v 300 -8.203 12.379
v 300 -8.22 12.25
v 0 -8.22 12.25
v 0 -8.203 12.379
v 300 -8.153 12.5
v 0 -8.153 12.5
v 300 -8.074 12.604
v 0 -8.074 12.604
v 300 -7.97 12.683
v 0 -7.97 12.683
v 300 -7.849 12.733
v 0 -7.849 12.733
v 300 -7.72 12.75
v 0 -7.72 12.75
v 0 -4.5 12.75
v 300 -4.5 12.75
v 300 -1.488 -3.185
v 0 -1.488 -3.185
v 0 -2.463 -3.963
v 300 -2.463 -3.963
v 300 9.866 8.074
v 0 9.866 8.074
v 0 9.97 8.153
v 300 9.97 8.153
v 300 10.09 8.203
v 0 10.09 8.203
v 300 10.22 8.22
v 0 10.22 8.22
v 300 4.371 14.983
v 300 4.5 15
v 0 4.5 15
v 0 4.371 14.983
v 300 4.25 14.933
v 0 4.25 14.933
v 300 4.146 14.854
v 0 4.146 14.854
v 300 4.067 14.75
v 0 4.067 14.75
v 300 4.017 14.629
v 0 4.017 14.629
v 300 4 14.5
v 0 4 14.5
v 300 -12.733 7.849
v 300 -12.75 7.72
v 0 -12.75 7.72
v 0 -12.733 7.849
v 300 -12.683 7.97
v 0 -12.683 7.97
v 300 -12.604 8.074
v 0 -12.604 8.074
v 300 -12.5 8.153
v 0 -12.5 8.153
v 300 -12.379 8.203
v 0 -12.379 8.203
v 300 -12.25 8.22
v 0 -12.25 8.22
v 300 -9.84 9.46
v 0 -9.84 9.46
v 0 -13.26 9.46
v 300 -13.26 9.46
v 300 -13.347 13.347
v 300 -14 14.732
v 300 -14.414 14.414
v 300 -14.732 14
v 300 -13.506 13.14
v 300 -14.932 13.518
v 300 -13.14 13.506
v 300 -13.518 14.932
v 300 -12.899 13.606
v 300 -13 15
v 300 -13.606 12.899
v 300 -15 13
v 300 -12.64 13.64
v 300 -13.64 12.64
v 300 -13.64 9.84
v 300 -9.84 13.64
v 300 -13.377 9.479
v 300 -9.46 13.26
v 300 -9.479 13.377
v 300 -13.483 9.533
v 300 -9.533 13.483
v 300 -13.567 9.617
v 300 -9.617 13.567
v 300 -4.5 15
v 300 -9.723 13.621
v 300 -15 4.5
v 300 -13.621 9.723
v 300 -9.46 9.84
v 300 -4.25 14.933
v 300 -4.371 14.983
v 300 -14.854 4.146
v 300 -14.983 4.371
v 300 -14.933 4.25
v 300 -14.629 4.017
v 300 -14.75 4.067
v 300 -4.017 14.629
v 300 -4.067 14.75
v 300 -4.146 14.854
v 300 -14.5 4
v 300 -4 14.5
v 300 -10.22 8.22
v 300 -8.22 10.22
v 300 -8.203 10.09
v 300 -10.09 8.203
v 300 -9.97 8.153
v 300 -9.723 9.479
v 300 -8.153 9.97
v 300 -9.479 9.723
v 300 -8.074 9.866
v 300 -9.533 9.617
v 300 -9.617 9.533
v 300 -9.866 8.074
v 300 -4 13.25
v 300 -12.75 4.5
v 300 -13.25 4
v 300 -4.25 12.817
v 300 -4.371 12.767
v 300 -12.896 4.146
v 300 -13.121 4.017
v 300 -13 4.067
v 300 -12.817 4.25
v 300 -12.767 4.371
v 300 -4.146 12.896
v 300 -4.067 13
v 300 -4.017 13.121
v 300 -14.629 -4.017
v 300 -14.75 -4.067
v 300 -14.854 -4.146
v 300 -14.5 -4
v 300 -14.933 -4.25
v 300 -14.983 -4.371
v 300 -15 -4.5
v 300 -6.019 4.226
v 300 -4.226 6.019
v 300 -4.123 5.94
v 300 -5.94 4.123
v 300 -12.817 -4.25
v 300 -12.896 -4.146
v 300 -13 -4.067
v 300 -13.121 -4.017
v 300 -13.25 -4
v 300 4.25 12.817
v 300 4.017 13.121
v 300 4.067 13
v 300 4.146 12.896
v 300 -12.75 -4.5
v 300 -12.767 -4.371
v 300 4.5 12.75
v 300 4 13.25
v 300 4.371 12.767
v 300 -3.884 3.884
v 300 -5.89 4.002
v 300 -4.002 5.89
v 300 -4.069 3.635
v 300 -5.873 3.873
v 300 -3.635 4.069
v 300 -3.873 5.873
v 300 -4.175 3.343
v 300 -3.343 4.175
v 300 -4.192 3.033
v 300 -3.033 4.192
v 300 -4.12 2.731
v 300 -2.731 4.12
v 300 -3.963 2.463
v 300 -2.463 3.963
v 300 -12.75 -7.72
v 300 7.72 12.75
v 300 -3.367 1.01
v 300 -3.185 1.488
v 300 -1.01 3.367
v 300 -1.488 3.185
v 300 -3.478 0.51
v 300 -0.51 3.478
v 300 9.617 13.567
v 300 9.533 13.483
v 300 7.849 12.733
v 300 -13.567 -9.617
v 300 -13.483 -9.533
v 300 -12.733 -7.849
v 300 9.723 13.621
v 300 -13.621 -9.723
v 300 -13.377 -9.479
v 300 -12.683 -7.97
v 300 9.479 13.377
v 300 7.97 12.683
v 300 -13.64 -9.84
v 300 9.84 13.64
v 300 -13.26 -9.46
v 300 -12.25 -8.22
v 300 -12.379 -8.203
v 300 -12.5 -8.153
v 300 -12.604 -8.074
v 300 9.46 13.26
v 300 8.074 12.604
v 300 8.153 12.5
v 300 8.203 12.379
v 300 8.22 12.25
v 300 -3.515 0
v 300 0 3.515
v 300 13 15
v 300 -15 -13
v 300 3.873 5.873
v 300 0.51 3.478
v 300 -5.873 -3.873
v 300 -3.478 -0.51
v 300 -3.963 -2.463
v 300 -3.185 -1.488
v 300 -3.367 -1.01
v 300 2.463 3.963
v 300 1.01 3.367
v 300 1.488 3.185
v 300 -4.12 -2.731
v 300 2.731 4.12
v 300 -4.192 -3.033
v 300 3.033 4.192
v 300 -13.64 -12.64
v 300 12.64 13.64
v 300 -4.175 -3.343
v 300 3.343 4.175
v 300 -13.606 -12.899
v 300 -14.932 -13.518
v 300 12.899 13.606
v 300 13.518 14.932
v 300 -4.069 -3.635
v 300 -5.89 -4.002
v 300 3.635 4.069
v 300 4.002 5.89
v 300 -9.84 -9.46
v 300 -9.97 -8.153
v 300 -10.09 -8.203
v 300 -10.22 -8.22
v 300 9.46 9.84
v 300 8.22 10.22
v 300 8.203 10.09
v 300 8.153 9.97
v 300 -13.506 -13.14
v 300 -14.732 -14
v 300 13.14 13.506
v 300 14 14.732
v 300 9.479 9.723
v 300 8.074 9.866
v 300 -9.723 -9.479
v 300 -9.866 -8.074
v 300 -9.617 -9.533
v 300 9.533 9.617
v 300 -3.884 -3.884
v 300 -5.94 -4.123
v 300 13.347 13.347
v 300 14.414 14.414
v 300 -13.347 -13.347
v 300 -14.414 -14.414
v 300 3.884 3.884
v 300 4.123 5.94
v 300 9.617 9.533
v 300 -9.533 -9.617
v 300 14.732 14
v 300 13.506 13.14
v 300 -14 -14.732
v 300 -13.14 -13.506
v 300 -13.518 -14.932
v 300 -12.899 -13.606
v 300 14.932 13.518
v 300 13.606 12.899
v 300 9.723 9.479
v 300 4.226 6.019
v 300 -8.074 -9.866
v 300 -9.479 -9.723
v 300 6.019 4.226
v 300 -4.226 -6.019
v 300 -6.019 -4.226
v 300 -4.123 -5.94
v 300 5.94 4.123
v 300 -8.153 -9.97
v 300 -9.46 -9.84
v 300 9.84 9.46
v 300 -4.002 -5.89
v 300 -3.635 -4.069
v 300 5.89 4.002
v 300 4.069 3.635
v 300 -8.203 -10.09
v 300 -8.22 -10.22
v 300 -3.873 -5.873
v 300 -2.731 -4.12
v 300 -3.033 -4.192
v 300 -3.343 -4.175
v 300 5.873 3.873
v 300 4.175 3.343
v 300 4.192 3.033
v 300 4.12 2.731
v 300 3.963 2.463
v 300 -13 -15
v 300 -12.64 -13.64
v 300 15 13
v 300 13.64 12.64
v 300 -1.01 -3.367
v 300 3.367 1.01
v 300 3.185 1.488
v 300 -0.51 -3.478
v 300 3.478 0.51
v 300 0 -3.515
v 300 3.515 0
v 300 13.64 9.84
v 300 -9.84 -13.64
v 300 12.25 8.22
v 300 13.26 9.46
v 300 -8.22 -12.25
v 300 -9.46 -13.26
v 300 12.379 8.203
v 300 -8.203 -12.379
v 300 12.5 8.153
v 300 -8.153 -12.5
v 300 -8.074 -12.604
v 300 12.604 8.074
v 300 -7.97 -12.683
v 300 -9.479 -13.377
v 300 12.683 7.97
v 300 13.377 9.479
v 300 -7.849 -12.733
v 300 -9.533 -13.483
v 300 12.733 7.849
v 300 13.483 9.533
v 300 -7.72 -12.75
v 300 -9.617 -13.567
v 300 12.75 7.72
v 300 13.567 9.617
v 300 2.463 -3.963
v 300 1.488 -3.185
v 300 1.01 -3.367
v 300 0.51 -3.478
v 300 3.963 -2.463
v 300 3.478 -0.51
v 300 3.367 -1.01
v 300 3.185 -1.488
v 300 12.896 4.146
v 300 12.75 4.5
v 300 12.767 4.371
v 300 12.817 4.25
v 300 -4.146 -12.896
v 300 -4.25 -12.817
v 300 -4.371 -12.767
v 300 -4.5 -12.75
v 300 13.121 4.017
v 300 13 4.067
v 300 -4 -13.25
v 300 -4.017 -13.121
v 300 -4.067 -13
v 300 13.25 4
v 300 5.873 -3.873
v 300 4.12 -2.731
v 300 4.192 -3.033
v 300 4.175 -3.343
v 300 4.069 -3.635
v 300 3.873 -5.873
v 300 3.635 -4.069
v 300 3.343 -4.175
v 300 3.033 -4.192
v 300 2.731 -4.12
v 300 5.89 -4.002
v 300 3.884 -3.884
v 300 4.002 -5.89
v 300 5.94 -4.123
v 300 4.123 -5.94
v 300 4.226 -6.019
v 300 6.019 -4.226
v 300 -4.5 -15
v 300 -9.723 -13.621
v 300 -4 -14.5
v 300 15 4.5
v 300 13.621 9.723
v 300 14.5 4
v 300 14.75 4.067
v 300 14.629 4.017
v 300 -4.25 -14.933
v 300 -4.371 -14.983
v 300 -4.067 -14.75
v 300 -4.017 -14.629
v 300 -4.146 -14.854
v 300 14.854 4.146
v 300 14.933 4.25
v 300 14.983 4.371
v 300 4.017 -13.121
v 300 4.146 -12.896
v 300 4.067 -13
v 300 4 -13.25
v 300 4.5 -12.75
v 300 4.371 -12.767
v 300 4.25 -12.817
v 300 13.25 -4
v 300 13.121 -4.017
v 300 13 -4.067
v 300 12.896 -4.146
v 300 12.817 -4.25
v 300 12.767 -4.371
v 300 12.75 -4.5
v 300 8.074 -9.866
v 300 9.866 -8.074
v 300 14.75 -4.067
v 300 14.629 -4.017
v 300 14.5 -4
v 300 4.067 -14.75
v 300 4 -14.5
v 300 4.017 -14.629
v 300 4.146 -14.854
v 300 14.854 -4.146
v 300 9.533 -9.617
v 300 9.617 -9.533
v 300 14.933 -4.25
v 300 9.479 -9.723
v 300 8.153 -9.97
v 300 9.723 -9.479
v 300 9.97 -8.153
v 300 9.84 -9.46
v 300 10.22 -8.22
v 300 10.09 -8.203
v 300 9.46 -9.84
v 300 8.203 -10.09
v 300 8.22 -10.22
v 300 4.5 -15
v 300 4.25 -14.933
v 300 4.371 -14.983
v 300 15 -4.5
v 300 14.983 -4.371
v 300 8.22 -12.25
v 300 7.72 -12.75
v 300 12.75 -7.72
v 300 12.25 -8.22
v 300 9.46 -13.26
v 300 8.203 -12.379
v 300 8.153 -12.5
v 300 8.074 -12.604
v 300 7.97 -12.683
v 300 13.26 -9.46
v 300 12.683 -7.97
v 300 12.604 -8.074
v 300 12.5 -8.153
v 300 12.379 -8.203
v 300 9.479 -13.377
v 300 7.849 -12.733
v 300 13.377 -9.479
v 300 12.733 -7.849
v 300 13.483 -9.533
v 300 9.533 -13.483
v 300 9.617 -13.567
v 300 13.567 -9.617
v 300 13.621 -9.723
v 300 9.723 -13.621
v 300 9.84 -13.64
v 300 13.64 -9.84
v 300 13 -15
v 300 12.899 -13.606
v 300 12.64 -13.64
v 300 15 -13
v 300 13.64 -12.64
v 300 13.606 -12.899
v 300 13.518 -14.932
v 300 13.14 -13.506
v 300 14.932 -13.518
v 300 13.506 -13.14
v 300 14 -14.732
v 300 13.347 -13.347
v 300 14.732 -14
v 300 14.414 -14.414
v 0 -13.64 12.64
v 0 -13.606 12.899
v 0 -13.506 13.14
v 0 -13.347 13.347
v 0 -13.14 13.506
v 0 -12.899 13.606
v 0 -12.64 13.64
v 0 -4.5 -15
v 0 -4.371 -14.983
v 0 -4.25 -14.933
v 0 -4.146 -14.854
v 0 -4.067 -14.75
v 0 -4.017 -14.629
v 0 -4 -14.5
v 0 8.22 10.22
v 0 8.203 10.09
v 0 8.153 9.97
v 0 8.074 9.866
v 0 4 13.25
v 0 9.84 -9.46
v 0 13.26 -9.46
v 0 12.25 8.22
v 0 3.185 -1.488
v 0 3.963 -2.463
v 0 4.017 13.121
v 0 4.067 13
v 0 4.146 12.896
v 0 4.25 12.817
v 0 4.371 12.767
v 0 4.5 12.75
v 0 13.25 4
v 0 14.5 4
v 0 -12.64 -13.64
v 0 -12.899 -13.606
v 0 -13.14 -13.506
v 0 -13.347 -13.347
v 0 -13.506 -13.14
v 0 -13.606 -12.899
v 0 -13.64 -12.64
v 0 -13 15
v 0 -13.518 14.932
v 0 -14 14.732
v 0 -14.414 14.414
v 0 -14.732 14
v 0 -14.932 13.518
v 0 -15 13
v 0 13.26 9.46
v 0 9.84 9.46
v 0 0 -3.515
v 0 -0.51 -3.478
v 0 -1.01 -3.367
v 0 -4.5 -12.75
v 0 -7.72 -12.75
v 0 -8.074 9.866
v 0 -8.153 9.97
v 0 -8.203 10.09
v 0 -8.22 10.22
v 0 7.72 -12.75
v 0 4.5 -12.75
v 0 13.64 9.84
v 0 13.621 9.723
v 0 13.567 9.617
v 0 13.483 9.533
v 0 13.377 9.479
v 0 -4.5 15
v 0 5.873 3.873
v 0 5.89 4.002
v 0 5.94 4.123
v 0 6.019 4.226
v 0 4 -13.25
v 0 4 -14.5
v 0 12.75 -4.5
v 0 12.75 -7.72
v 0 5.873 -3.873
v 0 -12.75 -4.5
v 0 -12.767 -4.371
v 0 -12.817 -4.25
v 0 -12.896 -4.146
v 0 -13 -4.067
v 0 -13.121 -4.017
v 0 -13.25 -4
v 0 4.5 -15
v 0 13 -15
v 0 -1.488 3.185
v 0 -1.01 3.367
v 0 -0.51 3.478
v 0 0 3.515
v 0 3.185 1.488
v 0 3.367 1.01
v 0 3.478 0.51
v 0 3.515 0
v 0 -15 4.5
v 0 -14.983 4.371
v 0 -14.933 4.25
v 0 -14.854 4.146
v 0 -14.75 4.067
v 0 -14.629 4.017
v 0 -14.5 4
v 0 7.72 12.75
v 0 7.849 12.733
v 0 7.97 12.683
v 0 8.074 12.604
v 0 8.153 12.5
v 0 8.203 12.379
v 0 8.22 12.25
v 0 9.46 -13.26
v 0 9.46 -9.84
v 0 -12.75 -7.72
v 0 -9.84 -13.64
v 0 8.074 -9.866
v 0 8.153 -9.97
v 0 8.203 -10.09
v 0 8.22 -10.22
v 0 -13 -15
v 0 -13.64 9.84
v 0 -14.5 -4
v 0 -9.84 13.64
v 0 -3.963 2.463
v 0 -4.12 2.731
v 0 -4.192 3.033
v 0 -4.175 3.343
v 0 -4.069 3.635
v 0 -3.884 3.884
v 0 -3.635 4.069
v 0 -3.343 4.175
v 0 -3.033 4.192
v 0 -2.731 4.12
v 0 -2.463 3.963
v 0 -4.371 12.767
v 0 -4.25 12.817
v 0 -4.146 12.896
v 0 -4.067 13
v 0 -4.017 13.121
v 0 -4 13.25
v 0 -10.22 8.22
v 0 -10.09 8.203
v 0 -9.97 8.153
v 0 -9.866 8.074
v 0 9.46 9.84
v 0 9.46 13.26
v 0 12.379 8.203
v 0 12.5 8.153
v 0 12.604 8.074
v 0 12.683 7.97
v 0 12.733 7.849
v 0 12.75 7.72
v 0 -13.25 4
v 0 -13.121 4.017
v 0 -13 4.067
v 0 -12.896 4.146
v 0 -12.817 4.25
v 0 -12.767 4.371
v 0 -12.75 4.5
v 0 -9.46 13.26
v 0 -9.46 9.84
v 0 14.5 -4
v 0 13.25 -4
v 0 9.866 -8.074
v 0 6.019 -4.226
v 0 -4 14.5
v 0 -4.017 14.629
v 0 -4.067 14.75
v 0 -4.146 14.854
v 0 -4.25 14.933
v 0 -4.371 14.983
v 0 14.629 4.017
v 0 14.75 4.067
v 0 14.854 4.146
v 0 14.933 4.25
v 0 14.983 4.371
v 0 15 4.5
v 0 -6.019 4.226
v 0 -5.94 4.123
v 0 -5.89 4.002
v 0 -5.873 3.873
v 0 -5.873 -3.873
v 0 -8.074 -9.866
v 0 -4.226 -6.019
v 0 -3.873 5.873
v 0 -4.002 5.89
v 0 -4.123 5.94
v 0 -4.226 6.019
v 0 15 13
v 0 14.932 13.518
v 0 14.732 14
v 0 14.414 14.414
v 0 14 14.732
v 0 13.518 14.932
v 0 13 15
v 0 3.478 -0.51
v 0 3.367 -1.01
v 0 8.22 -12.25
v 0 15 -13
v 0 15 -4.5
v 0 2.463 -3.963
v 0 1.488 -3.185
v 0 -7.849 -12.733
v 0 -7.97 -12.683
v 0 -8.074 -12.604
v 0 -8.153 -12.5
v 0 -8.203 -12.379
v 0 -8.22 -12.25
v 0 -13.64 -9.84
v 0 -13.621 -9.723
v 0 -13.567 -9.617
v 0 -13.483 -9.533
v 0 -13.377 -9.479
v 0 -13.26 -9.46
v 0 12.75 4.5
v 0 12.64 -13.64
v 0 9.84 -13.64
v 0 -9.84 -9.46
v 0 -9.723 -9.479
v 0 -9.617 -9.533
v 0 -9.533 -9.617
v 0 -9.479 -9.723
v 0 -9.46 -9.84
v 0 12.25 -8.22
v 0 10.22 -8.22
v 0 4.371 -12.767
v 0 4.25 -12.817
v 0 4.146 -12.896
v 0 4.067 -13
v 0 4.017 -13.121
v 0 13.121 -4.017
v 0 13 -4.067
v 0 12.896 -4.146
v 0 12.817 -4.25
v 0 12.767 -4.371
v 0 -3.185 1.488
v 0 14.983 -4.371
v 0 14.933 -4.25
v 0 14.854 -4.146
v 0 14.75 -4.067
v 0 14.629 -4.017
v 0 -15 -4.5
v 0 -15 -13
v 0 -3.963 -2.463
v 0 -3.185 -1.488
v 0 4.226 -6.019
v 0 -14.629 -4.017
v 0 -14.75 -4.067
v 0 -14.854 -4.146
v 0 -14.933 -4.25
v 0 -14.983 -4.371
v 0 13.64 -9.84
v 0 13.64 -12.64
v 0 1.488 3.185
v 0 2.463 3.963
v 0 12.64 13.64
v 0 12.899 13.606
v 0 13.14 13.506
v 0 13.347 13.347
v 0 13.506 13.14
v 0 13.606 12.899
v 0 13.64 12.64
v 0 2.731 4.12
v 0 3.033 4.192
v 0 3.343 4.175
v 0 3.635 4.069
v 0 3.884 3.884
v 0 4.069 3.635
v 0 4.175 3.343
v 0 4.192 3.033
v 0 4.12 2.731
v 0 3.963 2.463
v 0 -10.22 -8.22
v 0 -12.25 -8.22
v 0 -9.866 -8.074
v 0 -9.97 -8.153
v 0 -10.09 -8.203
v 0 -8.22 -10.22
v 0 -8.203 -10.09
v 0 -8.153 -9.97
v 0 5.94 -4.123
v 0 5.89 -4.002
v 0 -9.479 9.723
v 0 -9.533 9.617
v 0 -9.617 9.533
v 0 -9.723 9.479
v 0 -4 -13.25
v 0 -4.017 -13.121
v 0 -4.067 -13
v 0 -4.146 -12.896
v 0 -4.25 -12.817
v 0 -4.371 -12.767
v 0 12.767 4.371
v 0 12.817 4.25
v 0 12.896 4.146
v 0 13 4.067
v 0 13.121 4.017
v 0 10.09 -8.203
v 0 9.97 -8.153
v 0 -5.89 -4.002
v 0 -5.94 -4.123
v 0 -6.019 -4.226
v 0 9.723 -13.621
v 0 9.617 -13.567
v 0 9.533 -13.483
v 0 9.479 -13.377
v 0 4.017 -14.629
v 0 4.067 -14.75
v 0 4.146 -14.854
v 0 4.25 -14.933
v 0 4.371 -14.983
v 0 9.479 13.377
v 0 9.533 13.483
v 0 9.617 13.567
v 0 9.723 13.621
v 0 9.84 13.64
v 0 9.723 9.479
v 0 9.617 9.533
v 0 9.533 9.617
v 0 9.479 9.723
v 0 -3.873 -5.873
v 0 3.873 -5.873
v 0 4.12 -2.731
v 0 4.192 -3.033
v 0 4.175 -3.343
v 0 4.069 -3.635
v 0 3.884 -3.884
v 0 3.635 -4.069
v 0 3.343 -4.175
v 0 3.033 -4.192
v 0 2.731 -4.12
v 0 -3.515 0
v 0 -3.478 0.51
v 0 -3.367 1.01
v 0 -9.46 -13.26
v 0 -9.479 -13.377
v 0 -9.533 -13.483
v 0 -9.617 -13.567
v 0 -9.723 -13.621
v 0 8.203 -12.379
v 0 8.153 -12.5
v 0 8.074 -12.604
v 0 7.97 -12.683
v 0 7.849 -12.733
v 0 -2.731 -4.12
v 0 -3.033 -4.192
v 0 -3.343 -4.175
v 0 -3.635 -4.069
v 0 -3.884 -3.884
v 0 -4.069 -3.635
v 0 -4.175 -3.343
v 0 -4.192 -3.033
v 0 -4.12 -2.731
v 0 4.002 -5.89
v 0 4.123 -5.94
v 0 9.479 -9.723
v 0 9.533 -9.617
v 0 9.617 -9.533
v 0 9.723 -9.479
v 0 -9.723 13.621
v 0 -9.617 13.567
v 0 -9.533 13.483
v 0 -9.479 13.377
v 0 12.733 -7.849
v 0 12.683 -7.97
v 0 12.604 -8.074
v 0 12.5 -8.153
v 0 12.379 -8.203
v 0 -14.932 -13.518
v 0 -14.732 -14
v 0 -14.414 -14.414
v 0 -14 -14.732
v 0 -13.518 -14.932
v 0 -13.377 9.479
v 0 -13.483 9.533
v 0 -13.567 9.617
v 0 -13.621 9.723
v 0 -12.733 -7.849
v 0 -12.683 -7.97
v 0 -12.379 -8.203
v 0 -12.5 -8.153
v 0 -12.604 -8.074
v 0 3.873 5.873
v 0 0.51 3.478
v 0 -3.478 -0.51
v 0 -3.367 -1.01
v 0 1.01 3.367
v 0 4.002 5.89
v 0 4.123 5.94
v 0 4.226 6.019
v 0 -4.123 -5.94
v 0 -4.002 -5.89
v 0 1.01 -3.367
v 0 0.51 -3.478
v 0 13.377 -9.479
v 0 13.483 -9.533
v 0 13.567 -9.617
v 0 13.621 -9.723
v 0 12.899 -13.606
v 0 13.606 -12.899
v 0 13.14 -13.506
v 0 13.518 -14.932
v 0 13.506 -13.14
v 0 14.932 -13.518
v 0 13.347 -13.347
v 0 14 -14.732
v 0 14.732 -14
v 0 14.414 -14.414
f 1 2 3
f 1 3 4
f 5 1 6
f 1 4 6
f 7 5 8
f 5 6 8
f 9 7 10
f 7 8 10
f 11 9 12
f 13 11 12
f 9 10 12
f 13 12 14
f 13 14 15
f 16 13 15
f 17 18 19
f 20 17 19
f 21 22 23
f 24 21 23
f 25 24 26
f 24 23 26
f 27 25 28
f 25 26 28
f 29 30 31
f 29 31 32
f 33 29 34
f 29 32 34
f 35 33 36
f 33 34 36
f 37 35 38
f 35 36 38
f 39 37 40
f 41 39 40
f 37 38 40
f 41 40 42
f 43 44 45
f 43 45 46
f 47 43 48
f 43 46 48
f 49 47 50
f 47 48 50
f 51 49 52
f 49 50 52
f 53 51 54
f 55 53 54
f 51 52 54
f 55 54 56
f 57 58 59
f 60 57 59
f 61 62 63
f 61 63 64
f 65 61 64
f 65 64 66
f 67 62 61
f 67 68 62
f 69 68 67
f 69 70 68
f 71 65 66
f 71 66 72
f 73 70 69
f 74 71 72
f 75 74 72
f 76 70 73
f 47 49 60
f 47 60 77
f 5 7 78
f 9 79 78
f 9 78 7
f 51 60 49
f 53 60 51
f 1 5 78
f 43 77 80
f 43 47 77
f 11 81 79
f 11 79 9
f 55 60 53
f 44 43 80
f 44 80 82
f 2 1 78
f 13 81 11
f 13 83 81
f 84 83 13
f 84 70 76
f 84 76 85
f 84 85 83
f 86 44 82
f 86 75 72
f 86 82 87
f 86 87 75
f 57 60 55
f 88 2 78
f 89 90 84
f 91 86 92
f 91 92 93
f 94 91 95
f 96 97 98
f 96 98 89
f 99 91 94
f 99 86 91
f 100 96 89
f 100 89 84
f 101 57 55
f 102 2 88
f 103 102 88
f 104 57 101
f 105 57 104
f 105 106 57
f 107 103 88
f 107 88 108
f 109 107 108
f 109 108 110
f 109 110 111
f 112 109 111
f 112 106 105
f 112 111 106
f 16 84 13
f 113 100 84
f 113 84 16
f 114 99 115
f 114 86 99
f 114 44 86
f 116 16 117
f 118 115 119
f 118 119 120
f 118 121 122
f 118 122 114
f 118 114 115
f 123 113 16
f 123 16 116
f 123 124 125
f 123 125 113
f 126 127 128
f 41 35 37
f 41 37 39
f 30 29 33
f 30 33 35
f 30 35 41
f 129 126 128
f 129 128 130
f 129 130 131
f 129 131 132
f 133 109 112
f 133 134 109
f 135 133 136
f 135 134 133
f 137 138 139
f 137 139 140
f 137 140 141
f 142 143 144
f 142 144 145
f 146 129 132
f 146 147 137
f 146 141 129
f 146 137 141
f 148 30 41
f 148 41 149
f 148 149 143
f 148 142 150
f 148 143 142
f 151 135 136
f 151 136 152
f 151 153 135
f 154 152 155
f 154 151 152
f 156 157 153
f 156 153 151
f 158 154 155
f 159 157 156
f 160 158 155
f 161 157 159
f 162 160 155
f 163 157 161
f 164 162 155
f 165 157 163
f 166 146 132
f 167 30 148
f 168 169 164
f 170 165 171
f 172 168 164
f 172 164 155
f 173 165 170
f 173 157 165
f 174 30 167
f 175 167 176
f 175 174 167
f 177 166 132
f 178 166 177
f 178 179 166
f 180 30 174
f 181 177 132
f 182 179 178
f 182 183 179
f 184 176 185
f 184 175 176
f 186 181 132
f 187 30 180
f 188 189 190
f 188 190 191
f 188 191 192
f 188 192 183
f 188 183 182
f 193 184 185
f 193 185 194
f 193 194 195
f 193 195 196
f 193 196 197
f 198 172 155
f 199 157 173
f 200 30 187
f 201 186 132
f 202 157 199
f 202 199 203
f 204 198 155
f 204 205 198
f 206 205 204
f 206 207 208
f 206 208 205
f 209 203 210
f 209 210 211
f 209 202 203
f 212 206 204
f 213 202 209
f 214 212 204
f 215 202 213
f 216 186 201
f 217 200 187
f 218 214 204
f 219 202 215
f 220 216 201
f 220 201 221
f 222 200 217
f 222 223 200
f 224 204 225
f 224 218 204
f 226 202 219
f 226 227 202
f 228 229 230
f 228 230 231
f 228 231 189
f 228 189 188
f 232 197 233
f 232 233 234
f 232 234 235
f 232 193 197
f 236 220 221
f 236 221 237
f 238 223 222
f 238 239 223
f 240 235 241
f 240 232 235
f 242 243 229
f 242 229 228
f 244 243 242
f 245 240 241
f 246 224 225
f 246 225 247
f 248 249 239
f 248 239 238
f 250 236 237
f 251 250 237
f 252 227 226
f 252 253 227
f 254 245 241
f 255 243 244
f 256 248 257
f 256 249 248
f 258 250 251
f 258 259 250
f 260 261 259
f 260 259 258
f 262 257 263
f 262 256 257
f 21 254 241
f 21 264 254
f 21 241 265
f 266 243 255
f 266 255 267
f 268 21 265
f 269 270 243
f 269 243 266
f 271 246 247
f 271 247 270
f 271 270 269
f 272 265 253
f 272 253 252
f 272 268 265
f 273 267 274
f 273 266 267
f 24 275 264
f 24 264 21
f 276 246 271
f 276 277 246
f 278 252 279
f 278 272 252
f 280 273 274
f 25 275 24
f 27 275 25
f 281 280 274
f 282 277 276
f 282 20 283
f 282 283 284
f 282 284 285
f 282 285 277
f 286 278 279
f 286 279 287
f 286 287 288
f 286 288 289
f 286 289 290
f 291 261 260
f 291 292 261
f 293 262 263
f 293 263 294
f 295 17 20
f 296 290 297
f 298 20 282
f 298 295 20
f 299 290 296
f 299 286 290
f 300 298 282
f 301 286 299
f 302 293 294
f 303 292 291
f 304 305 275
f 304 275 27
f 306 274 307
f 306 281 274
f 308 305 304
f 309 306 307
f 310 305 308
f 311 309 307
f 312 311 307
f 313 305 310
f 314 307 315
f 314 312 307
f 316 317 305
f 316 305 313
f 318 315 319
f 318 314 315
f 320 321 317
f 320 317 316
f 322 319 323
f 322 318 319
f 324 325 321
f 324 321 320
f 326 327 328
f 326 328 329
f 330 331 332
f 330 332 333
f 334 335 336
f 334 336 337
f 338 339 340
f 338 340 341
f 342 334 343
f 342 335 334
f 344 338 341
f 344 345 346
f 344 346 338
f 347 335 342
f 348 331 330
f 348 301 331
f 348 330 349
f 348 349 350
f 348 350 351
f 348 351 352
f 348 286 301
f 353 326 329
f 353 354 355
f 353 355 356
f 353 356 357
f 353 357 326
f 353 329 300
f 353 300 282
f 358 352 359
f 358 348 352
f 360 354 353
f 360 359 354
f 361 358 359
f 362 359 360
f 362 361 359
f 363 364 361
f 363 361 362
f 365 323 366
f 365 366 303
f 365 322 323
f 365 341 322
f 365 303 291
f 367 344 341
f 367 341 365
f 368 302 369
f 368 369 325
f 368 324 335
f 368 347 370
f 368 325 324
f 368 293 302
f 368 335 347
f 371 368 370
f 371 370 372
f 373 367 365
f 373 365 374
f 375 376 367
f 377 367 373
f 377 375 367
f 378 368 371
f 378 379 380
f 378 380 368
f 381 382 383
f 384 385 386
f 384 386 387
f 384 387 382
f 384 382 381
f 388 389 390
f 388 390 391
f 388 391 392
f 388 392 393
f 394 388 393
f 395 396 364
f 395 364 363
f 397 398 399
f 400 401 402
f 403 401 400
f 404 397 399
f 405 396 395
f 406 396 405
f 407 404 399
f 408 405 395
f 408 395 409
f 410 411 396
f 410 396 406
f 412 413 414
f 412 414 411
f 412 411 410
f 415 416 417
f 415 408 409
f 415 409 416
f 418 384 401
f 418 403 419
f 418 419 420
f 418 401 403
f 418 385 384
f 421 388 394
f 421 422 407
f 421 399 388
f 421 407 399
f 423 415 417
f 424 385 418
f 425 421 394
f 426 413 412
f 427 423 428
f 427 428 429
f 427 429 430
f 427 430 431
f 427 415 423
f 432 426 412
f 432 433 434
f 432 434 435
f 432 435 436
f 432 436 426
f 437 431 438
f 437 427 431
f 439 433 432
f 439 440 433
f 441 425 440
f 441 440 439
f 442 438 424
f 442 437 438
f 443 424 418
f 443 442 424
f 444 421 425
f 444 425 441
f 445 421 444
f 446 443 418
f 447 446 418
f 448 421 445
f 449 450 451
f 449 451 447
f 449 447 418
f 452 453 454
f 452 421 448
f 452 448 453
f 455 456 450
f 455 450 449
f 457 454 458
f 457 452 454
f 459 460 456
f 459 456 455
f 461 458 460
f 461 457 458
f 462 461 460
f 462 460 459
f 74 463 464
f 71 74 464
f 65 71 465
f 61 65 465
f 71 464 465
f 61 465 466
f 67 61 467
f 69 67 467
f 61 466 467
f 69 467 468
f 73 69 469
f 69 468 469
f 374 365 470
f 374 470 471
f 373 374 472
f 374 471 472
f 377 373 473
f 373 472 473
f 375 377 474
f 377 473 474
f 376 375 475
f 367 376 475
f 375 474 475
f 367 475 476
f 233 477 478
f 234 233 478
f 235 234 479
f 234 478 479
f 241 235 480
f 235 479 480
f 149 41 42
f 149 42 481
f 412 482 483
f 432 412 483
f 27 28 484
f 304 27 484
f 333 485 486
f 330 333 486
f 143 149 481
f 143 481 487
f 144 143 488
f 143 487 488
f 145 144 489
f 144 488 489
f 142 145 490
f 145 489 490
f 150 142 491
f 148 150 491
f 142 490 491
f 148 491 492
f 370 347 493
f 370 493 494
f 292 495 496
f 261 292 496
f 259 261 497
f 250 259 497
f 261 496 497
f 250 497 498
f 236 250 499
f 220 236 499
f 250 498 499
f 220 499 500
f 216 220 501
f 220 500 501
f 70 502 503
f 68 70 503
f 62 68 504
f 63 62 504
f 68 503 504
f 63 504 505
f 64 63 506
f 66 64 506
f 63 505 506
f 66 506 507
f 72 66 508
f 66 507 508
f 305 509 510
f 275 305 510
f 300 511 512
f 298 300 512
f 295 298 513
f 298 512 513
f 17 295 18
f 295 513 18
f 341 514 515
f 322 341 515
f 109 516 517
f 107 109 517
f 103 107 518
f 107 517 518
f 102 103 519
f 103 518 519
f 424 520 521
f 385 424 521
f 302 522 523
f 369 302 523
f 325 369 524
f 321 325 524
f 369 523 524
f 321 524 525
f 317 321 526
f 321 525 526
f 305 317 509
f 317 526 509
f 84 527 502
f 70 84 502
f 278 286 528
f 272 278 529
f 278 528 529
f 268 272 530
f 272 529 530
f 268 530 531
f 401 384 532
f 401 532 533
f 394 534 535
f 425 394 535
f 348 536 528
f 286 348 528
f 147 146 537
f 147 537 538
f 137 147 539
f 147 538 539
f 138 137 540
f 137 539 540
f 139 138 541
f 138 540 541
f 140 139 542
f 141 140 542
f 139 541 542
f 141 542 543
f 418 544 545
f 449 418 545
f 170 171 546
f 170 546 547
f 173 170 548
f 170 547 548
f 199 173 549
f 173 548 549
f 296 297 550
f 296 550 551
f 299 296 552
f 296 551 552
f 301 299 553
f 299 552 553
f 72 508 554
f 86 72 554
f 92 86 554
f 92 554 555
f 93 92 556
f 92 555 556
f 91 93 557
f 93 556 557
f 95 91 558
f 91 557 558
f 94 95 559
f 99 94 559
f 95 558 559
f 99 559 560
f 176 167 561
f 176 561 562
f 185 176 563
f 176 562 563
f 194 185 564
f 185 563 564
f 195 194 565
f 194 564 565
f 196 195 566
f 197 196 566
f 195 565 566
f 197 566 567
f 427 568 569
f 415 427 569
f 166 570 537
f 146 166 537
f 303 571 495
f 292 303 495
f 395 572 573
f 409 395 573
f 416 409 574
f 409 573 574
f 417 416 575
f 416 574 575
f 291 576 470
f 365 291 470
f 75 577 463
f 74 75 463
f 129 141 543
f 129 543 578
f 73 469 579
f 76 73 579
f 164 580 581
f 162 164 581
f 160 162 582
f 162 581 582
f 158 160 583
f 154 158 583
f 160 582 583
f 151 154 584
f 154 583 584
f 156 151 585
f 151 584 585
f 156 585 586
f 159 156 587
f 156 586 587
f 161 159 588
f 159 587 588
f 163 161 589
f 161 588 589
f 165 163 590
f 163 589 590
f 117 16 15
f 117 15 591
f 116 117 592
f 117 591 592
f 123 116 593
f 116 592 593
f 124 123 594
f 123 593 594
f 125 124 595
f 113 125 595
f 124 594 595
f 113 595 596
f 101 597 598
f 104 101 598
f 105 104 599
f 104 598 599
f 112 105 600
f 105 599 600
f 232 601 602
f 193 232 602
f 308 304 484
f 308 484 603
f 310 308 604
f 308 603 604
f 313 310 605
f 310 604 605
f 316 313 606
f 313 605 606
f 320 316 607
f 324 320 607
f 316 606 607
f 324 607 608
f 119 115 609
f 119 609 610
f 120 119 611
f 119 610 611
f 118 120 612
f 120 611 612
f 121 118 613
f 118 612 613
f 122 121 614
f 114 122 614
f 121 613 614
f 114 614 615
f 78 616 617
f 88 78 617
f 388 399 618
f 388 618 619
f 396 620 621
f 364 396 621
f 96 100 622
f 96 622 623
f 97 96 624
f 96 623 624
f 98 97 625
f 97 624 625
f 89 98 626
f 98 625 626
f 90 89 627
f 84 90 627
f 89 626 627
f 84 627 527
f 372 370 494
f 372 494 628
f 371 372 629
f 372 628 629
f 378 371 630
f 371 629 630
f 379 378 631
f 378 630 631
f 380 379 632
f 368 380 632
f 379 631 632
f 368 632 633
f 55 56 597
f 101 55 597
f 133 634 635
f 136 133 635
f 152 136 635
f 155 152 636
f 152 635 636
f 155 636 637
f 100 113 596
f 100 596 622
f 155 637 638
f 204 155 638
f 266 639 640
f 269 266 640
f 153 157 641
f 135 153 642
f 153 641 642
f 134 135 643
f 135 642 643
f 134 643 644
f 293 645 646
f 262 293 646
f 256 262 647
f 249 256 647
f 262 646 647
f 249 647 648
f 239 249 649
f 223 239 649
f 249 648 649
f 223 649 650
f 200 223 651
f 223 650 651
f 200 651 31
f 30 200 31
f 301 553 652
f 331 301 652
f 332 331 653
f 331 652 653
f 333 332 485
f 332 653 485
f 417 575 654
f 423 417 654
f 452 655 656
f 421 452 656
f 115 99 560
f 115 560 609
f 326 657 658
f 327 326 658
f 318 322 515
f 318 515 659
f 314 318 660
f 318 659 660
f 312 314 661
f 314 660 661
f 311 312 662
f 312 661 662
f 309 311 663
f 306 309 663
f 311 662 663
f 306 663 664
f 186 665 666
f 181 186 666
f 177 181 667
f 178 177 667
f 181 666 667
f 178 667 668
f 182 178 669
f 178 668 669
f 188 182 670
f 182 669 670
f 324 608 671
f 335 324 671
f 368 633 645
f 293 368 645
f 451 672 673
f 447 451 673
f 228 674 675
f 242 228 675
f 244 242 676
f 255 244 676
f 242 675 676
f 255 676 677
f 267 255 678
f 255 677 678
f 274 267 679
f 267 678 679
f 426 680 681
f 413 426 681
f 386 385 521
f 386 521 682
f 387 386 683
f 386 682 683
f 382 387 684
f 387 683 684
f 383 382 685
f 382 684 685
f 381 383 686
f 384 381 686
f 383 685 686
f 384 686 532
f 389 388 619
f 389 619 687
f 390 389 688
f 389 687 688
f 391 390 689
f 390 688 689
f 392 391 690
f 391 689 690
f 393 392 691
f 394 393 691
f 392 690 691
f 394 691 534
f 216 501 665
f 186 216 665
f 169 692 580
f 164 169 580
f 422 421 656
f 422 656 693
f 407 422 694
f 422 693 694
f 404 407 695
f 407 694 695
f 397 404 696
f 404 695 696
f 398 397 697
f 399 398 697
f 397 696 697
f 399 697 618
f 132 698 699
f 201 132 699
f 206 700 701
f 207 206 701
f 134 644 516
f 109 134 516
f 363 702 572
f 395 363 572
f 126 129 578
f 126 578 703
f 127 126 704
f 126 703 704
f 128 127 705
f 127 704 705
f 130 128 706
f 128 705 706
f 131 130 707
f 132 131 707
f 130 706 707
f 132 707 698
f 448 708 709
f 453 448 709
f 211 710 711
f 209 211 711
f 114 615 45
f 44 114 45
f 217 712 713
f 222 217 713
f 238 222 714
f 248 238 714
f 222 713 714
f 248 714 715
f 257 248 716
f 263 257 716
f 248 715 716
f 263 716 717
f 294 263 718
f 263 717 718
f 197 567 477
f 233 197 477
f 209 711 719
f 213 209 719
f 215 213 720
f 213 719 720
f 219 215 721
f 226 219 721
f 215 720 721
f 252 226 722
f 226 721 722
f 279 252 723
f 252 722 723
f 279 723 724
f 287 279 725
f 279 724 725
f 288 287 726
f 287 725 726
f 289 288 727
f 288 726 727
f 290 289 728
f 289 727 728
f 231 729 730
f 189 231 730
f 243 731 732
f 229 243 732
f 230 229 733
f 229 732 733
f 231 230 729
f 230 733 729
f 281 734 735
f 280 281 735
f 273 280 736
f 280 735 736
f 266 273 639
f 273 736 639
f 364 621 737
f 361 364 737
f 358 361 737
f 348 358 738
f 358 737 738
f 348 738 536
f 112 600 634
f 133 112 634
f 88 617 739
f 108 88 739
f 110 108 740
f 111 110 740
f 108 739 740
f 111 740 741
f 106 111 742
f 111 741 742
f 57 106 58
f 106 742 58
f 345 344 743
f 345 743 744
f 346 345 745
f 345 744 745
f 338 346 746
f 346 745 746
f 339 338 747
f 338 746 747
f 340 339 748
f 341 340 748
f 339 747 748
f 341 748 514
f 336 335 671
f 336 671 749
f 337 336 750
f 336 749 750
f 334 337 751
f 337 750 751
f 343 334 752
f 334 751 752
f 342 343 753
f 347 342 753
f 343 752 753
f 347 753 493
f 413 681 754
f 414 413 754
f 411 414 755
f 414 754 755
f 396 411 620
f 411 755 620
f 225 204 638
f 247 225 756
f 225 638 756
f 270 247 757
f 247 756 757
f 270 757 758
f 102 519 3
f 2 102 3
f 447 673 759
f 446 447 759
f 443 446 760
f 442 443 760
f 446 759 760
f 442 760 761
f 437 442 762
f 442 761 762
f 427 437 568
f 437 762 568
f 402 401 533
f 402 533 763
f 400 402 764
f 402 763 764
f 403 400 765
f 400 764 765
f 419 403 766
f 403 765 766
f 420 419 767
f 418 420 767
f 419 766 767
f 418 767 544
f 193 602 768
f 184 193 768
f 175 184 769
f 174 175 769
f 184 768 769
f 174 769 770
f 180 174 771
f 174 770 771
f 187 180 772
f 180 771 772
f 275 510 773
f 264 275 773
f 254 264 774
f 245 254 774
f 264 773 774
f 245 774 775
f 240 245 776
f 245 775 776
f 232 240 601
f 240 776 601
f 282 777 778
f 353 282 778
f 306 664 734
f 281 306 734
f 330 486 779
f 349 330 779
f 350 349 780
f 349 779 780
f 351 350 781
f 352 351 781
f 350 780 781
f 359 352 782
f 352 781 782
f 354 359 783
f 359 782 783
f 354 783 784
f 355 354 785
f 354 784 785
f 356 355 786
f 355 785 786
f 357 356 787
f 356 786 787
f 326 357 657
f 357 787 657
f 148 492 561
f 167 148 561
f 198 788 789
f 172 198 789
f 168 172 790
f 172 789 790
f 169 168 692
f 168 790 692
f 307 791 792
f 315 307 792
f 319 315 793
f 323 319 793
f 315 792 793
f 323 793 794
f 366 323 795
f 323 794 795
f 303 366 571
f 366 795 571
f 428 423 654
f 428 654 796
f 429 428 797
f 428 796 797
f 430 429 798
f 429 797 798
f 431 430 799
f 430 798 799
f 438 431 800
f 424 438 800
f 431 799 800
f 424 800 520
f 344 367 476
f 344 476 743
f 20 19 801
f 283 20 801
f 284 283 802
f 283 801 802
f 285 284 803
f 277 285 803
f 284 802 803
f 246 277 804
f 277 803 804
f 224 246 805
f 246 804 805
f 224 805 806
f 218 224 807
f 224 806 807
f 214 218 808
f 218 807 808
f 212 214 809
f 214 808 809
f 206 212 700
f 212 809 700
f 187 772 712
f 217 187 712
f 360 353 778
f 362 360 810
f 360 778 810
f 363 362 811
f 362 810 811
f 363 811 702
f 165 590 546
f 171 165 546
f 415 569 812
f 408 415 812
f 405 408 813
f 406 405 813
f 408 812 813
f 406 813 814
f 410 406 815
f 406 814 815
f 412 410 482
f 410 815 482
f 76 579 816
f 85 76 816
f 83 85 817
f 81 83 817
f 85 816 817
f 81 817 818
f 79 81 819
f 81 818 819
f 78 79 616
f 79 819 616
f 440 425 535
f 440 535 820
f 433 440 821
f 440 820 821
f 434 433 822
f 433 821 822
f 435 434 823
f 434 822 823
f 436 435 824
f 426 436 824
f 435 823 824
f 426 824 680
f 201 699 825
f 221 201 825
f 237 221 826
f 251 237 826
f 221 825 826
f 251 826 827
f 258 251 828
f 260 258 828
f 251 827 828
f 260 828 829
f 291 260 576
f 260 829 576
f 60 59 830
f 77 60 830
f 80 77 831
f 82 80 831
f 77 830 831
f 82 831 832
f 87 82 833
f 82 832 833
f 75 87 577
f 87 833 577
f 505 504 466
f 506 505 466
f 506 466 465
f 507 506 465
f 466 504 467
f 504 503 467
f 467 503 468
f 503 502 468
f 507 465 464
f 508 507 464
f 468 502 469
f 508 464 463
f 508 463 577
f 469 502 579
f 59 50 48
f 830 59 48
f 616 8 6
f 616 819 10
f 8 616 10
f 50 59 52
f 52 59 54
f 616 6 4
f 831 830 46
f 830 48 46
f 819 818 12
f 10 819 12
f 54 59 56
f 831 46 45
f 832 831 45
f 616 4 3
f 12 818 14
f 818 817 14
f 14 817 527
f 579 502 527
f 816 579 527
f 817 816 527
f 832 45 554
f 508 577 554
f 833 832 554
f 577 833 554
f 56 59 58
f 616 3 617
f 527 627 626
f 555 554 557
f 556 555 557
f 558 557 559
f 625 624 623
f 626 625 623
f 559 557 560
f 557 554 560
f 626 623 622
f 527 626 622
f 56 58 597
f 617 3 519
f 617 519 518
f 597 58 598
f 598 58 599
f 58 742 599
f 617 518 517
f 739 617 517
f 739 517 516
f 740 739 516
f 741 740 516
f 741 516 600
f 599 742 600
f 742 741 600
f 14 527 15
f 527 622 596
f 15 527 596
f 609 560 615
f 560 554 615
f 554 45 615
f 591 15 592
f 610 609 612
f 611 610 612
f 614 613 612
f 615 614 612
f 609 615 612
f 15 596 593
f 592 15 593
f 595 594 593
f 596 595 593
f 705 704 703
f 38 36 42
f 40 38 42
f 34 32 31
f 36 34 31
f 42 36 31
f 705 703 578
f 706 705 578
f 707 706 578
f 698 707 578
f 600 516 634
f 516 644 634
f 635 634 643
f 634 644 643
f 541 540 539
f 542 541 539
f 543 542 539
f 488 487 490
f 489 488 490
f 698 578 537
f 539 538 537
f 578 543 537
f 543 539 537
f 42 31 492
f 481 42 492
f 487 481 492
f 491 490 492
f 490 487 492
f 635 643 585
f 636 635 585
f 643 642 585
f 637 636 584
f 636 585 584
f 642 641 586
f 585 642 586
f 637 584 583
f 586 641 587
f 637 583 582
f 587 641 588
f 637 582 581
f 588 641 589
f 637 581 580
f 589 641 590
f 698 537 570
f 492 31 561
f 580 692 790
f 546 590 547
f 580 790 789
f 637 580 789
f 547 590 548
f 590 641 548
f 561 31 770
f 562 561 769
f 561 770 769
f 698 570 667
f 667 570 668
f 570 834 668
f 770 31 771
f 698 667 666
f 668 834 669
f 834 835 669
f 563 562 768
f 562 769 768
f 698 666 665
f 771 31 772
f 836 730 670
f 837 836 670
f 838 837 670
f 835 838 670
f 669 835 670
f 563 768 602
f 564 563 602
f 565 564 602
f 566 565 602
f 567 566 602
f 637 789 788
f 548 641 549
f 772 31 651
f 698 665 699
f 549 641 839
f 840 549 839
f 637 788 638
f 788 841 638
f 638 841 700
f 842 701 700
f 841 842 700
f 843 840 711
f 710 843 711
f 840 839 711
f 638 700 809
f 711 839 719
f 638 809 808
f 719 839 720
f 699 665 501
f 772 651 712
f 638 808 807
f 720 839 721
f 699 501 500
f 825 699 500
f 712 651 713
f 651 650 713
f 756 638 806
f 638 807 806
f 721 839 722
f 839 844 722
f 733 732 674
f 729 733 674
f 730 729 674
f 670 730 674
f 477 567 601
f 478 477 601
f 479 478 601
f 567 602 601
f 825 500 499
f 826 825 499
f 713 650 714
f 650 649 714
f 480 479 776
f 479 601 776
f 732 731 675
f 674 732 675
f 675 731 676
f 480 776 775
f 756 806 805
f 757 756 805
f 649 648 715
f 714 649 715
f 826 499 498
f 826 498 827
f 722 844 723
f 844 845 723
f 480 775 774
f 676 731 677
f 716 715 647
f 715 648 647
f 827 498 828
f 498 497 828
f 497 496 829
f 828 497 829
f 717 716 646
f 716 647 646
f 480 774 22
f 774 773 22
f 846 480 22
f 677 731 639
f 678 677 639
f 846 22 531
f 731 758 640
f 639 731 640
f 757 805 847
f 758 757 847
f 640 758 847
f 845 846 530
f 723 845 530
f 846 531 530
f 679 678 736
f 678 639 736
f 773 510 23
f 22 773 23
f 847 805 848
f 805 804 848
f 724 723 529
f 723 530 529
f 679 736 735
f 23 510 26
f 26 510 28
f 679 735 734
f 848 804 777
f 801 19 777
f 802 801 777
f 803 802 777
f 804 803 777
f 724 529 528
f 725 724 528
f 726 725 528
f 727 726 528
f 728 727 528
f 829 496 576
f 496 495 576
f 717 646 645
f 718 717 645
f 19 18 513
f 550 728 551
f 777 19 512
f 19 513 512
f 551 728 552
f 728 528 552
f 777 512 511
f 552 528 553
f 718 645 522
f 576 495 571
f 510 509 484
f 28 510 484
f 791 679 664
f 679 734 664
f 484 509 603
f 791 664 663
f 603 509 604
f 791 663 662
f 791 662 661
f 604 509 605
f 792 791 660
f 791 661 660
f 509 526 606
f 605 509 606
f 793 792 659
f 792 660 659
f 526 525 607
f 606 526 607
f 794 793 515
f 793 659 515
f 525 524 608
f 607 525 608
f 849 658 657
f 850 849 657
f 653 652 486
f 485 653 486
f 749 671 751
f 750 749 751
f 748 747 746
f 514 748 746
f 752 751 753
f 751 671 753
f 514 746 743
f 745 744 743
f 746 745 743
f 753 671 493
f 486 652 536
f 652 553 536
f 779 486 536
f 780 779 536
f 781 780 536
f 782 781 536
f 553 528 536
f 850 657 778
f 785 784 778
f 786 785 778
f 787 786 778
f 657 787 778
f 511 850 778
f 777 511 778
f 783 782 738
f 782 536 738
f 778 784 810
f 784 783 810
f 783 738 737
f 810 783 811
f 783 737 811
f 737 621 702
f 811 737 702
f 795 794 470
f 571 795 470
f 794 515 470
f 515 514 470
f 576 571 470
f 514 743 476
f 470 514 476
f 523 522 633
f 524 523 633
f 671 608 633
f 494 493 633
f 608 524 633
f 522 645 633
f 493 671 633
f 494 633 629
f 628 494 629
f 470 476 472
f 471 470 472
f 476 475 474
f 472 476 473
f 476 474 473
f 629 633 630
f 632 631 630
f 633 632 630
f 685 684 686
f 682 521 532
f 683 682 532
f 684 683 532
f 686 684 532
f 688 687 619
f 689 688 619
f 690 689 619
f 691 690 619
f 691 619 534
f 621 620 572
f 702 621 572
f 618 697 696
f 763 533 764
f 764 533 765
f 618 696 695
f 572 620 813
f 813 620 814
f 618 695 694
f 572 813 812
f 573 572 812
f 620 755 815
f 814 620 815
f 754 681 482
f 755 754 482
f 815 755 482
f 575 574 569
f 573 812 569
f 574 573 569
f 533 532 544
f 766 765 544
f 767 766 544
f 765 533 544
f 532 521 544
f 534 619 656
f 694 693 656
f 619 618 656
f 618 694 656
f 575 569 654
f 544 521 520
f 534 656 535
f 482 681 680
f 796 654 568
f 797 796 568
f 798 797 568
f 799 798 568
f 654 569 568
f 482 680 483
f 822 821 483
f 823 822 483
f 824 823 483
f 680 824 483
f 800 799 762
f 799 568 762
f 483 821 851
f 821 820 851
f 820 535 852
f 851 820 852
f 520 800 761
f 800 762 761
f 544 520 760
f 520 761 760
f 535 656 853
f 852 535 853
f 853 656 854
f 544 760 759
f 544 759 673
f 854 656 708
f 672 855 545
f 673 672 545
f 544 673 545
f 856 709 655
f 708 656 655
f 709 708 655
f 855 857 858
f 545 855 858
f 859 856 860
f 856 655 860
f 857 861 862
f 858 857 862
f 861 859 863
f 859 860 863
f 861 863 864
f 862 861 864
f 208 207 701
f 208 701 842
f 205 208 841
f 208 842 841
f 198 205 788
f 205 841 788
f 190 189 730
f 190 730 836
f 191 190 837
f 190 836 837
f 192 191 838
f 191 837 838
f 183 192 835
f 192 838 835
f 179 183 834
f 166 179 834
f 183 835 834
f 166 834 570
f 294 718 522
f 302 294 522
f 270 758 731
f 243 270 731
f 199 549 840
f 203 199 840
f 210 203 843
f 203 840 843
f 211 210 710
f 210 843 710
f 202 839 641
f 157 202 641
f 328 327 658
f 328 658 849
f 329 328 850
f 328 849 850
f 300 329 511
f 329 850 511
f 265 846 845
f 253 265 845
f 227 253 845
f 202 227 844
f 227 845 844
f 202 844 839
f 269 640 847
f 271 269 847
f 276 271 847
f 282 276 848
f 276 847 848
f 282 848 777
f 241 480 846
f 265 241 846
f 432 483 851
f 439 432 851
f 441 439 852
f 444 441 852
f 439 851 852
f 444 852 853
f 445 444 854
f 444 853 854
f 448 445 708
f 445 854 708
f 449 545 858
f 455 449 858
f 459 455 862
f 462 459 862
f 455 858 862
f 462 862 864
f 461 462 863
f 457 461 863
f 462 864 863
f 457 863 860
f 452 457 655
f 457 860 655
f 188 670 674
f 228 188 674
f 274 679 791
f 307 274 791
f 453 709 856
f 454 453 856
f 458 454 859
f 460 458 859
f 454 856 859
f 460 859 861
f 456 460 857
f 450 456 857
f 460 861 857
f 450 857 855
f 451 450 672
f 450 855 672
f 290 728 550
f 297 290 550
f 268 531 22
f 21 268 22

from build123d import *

# Parameters (mm, degrees)
PERFIL_COM_ALUMINIO_PERFIL_COMER_30_X_DEPTH = 300


with BuildPart() as part:
    # Esboço11 → Perfil com. aluminio PERFIL COMER. 30 X 30(1) (new body)
    with BuildSketch(Plane(origin=(0, 0, 0), x_dir=(0, 0, -1), z_dir=(1, 0, 0))):
        with BuildLine():
            Line((0, 5.872725395), (-3.872893219, 5.872725395))
            ThreePointArc((-3.872893219, 5.872725395), (-4.064234935, 5.910785628), (-4.226446609, 6.019172004))
            Line((-4.226446609, 6.019172004), (-8.073553391, 9.866278785))
            ThreePointArc((-8.073553391, 9.866278785), (-8.181939766, 10.02849046), (-8.22, 10.219832176))
            Line((-8.22, 10.219832176), (-8.22, 12.25))
            ThreePointArc((-8.22, 12.25), (-8.073553391, 12.603553391), (-7.72, 12.75))
            Line((-7.72, 12.75), (-4.5, 12.75))
            ThreePointArc((-4.5, 12.75), (-4.146446609, 12.896446609), (-4, 13.25))
            Line((-4, 13.25), (-4, 14.5))
            ThreePointArc((-4, 14.5), (-4.146446609, 14.853553391), (-4.5, 15))
            Line((-4.5, 15), (-13, 15))
            ThreePointArc((-13, 15), (-14.414213562, 14.414213562), (-15, 13))
            Line((-15, 13), (-15, 4.5))
            ThreePointArc((-15, 4.5), (-14.853553391, 4.146446609), (-14.5, 4))
            Line((-14.5, 4), (-13.25, 4))
            ThreePointArc((-13.25, 4), (-12.896446609, 4.146446609), (-12.75, 4.5))
            Line((-12.75, 4.5), (-12.75, 7.72))
            ThreePointArc((-12.75, 7.72), (-12.603553391, 8.073553391), (-12.25, 8.22))
            Line((-12.25, 8.22), (-10.219832176, 8.22))
            ThreePointArc((-10.219832176, 8.22), (-10.02849046, 8.181939766), (-9.866278785, 8.073553391))
            Line((-9.866278785, 8.073553391), (-6.019172004, 4.226446609))
            ThreePointArc((-6.019172004, 4.226446609), (-5.910785628, 4.064234935), (-5.872725395, 3.872893219))
            Line((-5.872725395, 3.872893219), (-5.872725395, 0))
            Line((-5.872725395, 0), (-5.872725395, -3.872893219))
            ThreePointArc((-5.872725395, -3.872893219), (-5.910785628, -4.064234935), (-6.019172004, -4.226446609))
            Line((-6.019172004, -4.226446609), (-9.866278785, -8.073553391))
            ThreePointArc((-9.866278785, -8.073553391), (-10.02849046, -8.181939766), (-10.219832176, -8.22))
            Line((-10.219832176, -8.22), (-12.25, -8.22))
            ThreePointArc((-12.25, -8.22), (-12.603553391, -8.073553391), (-12.75, -7.72))
            Line((-12.75, -7.72), (-12.75, -4.5))
            ThreePointArc((-12.75, -4.5), (-12.896446609, -4.146446609), (-13.25, -4))
            Line((-13.25, -4), (-14.5, -4))
            ThreePointArc((-14.5, -4), (-14.853553391, -4.146446609), (-15, -4.5))
            Line((-15, -4.5), (-15, -13))
            ThreePointArc((-15, -13), (-14.414213562, -14.414213562), (-13, -15))
            Line((-13, -15), (-4.5, -15))
            ThreePointArc((-4.5, -15), (-4.146446609, -14.853553391), (-4, -14.5))
            Line((-4, -14.5), (-4, -13.25))
            ThreePointArc((-4, -13.25), (-4.146446609, -12.896446609), (-4.5, -12.75))
            Line((-4.5, -12.75), (-7.72, -12.75))
            ThreePointArc((-7.72, -12.75), (-8.073553391, -12.603553391), (-8.22, -12.25))
            Line((-8.22, -12.25), (-8.22, -10.219832176))
            ThreePointArc((-8.22, -10.219832176), (-8.181939766, -10.02849046), (-8.073553391, -9.866278785))
            Line((-8.073553391, -9.866278785), (-4.226446609, -6.019172004))
            ThreePointArc((-4.226446609, -6.019172004), (-4.064234935, -5.910785628), (-3.872893219, -5.872725395))
            Line((-3.872893219, -5.872725395), (0, -5.872725395))
            Line((0, -5.872725395), (3.872893219, -5.872725395))
            ThreePointArc((3.872893219, -5.872725395), (4.064234935, -5.910785628), (4.226446609, -6.019172004))
            Line((4.226446609, -6.019172004), (8.073553391, -9.866278785))
            ThreePointArc((8.073553391, -9.866278785), (8.181939766, -10.02849046), (8.22, -10.219832176))
            Line((8.22, -10.219832176), (8.22, -12.25))
            ThreePointArc((8.22, -12.25), (8.073553391, -12.603553391), (7.72, -12.75))
            Line((7.72, -12.75), (4.5, -12.75))
            ThreePointArc((4.5, -12.75), (4.146446609, -12.896446609), (4, -13.25))
            Line((4, -13.25), (4, -14.5))
            ThreePointArc((4, -14.5), (4.146446609, -14.853553391), (4.5, -15))
            Line((4.5, -15), (13, -15))
            ThreePointArc((13, -15), (14.414213562, -14.414213562), (15, -13))
            Line((15, -13), (15, -4.5))
            ThreePointArc((15, -4.5), (14.853553391, -4.146446609), (14.5, -4))
            Line((14.5, -4), (13.25, -4))
            ThreePointArc((13.25, -4), (12.896446609, -4.146446609), (12.75, -4.5))
            Line((12.75, -4.5), (12.75, -7.72))
            ThreePointArc((12.75, -7.72), (12.603553391, -8.073553391), (12.25, -8.22))
            Line((12.25, -8.22), (10.219832176, -8.22))
            ThreePointArc((10.219832176, -8.22), (10.02849046, -8.181939766), (9.866278785, -8.073553391))
            Line((9.866278785, -8.073553391), (6.019172004, -4.226446609))
            ThreePointArc((6.019172004, -4.226446609), (5.910785628, -4.064234935), (5.872725395, -3.872893219))
            Line((5.872725395, -3.872893219), (5.872725395, 0))
            Line((5.872725395, 0), (5.872725395, 3.872893219))
            ThreePointArc((5.872725395, 3.872893219), (5.910785628, 4.064234935), (6.019172004, 4.226446609))
            Line((6.019172004, 4.226446609), (9.866278785, 8.073553391))
            ThreePointArc((9.866278785, 8.073553391), (10.02849046, 8.181939766), (10.219832176, 8.22))
            Line((10.219832176, 8.22), (12.25, 8.22))
            ThreePointArc((12.25, 8.22), (12.603553391, 8.073553391), (12.75, 7.72))
            Line((12.75, 7.72), (12.75, 4.5))
            ThreePointArc((12.75, 4.5), (12.896446609, 4.146446609), (13.25, 4))
            Line((13.25, 4), (14.5, 4))
            ThreePointArc((14.5, 4), (14.853553391, 4.146446609), (15, 4.5))
            Line((15, 4.5), (15, 13))
            ThreePointArc((15, 13), (14.414213562, 14.414213562), (13, 15))
            Line((13, 15), (4.5, 15))
            ThreePointArc((4.5, 15), (4.146446609, 14.853553391), (4, 14.5))
            Line((4, 14.5), (4, 13.25))
            ThreePointArc((4, 13.25), (4.146446609, 12.896446609), (4.5, 12.75))
            Line((4.5, 12.75), (7.72, 12.75))
            ThreePointArc((7.72, 12.75), (8.073553391, 12.603553391), (8.22, 12.25))
            Line((8.22, 12.25), (8.22, 10.219832176))
            ThreePointArc((8.22, 10.219832176), (8.181939766, 10.02849046), (8.073553391, 9.866278785))
            Line((8.073553391, 9.866278785), (4.226446609, 6.019172004))
            ThreePointArc((4.226446609, 6.019172004), (4.064234935, 5.910785628), (3.872893219, 5.872725395))
            Line((3.872893219, 5.872725395), (0, 5.872725395))
        make_face()
        with BuildLine():
            Line((-3.184880901, 1.488031663), (-3.963428513, 2.463089414))
            ThreePointArc((-3.963428513, 2.463089414), (-3.884059168, 3.884060272), (-2.463088278, 3.963429044))
            Line((-2.463088278, 3.963429044), (-1.488030527, 3.184881432))
            ThreePointArc((-1.488030527, 3.184881432), (-0.762142415, 3.431740597), (6.27e-07, 3.515352697))
            ThreePointArc((6.27e-07, 3.515352697), (0.762143639, 3.431740325), (1.488031663, 3.184880901))
            Line((1.488031663, 3.184880901), (2.463089414, 3.963428513))
            ThreePointArc((2.463089414, 3.963428513), (3.884060272, 3.884059168), (3.963429044, 2.463088278))
            Line((3.963429044, 2.463088278), (3.184881432, 1.488030527))
            ThreePointArc((3.184881432, 1.488030527), (3.431740597, 0.762142415), (3.515352697, -6.27e-07))
            ThreePointArc((3.515352697, -6.27e-07), (3.431740325, -0.762143639), (3.184880901, -1.488031663))
            Line((3.184880901, -1.488031663), (3.963428513, -2.463089414))
            ThreePointArc((3.963428513, -2.463089414), (3.884059168, -3.884060272), (2.463088278, -3.963429044))
            Line((2.463088278, -3.963429044), (1.488030527, -3.184881432))
            ThreePointArc((1.488030527, -3.184881432), (0.762142415, -3.431740597), (-6.27e-07, -3.515352697))
            ThreePointArc((-6.27e-07, -3.515352697), (-0.762143639, -3.431740325), (-1.488031663, -3.184880901))
            Line((-1.488031663, -3.184880901), (-2.463089414, -3.963428513))
            ThreePointArc((-2.463089414, -3.963428513), (-3.884060272, -3.884059168), (-3.963429044, -2.463088278))
            Line((-3.963429044, -2.463088278), (-3.184881432, -1.488030527))
            ThreePointArc((-3.184881432, -1.488030527), (-3.431740597, -0.762142415), (-3.515352697, 6.27e-07))
            ThreePointArc((-3.515352697, 6.27e-07), (-3.431740325, 0.762143639), (-3.184880901, 1.488031663))
        make_face(mode=Mode.SUBTRACT)
        with BuildLine():
            Line((-9.46, 13.26), (-9.46, 9.84))
            ThreePointArc((-9.46, 9.84), (-9.571299423, 9.571299423), (-9.84, 9.46))
            Line((-9.84, 9.46), (-13.26, 9.46))
            ThreePointArc((-13.26, 9.46), (-13.528700577, 9.571299423), (-13.64, 9.84))
            Line((-13.64, 9.84), (-13.64, 12.64))
            ThreePointArc((-13.64, 12.64), (-13.347106781, 13.347106781), (-12.64, 13.64))
            Line((-12.64, 13.64), (-9.84, 13.64))
            ThreePointArc((-9.84, 13.64), (-9.571299423, 13.528700577), (-9.46, 13.26))
        make_face(mode=Mode.SUBTRACT)
        with BuildLine():
            Line((13.64, 12.64), (13.64, 9.84))
            ThreePointArc((13.64, 9.84), (13.528700577, 9.571299423), (13.26, 9.46))
            Line((13.26, 9.46), (9.84, 9.46))
            ThreePointArc((9.84, 9.46), (9.571299423, 9.571299423), (9.46, 9.84))
            Line((9.46, 9.84), (9.46, 13.26))
            ThreePointArc((9.46, 13.26), (9.571299423, 13.528700577), (9.84, 13.64))
            Line((9.84, 13.64), (12.64, 13.64))
            ThreePointArc((12.64, 13.64), (13.347106781, 13.347106781), (13.64, 12.64))
        make_face(mode=Mode.SUBTRACT)
        with BuildLine():
            Line((12.64, -13.64), (9.84, -13.64))
            ThreePointArc((9.84, -13.64), (9.571299423, -13.528700577), (9.46, -13.26))
            Line((9.46, -13.26), (9.46, -9.84))
            ThreePointArc((9.46, -9.84), (9.571299423, -9.571299423), (9.84, -9.46))
            Line((9.84, -9.46), (13.26, -9.46))
            ThreePointArc((13.26, -9.46), (13.528700577, -9.571299423), (13.64, -9.84))
            Line((13.64, -9.84), (13.64, -12.64))
            ThreePointArc((13.64, -12.64), (13.347106781, -13.347106781), (12.64, -13.64))
        make_face(mode=Mode.SUBTRACT)
        with BuildLine():
            Line((-13.64, -12.64), (-13.64, -9.84))
            ThreePointArc((-13.64, -9.84), (-13.528700577, -9.571299423), (-13.26, -9.46))
            Line((-13.26, -9.46), (-9.84, -9.46))
            ThreePointArc((-9.84, -9.46), (-9.571299423, -9.571299423), (-9.46, -9.84))
            Line((-9.46, -9.84), (-9.46, -13.26))
            ThreePointArc((-9.46, -13.26), (-9.571299423, -13.528700577), (-9.84, -13.64))
            Line((-9.84, -13.64), (-12.64, -13.64))
            ThreePointArc((-12.64, -13.64), (-13.347106781, -13.347106781), (-13.64, -12.64))
        make_face(mode=Mode.SUBTRACT)
    extrude(amount=PERFIL_COM_ALUMINIO_PERFIL_COMER_30_X_DEPTH)


solid = part.part
